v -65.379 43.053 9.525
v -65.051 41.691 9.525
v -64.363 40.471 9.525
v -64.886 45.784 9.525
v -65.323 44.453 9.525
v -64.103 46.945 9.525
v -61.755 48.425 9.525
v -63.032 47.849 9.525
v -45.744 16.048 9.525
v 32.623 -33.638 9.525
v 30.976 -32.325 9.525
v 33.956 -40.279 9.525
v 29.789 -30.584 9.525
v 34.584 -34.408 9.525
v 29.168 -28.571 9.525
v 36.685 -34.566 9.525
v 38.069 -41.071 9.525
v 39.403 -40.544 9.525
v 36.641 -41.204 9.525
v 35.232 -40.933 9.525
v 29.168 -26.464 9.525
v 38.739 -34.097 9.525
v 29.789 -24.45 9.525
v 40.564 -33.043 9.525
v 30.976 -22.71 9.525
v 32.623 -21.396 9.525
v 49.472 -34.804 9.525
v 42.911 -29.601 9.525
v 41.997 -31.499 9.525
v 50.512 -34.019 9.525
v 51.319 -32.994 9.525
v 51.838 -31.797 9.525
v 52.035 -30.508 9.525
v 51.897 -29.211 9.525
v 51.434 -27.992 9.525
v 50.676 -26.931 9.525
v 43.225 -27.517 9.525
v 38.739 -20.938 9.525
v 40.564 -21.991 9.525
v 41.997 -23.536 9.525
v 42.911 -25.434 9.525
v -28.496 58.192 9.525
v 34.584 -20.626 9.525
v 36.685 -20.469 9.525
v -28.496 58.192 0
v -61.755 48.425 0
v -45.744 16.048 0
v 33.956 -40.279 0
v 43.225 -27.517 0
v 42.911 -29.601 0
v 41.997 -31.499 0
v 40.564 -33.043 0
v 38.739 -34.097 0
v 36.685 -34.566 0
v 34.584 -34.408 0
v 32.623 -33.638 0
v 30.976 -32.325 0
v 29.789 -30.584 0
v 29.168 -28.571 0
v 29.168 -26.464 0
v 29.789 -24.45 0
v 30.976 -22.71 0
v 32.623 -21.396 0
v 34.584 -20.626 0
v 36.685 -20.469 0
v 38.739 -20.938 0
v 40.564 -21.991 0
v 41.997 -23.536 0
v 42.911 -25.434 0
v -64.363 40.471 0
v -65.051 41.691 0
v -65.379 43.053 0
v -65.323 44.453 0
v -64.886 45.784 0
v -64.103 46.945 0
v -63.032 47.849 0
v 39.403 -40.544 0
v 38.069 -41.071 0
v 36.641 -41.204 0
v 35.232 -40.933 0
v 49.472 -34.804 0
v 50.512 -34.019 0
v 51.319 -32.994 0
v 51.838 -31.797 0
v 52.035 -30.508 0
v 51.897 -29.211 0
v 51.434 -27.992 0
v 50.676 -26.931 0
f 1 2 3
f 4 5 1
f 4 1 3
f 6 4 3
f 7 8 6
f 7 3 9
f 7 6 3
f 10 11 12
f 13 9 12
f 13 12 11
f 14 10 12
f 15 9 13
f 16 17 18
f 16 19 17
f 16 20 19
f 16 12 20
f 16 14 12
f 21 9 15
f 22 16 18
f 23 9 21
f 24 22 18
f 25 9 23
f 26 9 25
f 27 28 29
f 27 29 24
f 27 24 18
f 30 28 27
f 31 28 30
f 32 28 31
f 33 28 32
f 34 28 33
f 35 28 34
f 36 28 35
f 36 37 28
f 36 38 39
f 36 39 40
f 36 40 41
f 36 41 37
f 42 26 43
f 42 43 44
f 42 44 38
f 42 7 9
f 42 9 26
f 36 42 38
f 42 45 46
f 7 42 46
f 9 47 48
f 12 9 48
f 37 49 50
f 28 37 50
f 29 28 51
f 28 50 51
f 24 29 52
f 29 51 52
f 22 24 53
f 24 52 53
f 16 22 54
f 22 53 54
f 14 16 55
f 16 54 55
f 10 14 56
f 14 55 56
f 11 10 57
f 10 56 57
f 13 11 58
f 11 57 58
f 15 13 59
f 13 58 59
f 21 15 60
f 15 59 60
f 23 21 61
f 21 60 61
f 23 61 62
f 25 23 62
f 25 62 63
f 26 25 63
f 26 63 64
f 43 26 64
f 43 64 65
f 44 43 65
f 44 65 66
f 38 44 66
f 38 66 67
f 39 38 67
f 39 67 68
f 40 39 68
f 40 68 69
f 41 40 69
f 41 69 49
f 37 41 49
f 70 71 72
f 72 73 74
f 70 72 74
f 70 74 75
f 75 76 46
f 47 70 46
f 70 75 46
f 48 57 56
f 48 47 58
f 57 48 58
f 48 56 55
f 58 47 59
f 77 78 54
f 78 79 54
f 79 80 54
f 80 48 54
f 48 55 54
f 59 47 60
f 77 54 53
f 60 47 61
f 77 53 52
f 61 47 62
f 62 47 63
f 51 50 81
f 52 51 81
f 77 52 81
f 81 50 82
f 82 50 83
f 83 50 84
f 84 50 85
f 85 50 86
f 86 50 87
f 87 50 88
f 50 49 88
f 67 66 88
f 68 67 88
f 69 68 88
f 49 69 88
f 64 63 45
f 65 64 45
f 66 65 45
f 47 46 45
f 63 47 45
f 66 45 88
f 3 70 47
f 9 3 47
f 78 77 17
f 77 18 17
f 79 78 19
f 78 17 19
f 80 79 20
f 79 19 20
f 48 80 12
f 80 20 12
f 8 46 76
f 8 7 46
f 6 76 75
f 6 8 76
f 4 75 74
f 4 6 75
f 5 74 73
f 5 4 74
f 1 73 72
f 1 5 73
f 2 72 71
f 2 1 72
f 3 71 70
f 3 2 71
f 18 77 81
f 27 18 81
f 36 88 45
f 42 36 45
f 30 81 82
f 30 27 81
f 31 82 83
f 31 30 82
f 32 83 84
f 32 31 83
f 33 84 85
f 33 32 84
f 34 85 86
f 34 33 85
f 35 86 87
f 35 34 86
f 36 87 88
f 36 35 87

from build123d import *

# Parameters (mm, degrees)
F1_DEPTH = 9.525
F2_R     = 5.08
F3_R     = 5.08
F4_R     = 5.08
F5_R     = 7.06815
F6_DEPTH = 75.62089


with BuildPart() as f1:
    # F0 (on Top) → F1 (new body)
    with BuildSketch(Plane.XY):
        Polygon((36.595166, -42.144418), (55.044204, -31.628042), (-28.496206, 58.19229), (-68.840876, 46.343863), (-45.743927, 16.047873), align=None)
    extrude(amount=F1_DEPTH)

    # F2
    f2_edges = [f1.edges().sort_by_distance(p)[0] for p in [
        (-68.840876, 46.343863, 4.7625),
    ]]
    fillet(f2_edges, radius=F2_R)

    # F3
    f3_edges = [f1.edges().sort_by_distance(p)[0] for p in [
        (36.595166, -42.144418, 4.7625),
    ]]
    fillet(f3_edges, radius=F3_R)

    # F4
    f4_edges = [f1.edges().sort_by_distance(p)[0] for p in [
        (55.044204, -31.628042, 4.7625),
    ]]
    fillet(f4_edges, radius=F4_R)

    # F5 (on face) → F6 (cut)
    with BuildSketch(Plane(origin=(0, 0, 0), x_dir=(1, 0, 0), z_dir=(0, 0, -1))):
        with Locations((36.157202, 27.517132)):
            Circle(F5_R)
    extrude(amount=-F6_DEPTH, mode=Mode.SUBTRACT)


solid = f1.part
